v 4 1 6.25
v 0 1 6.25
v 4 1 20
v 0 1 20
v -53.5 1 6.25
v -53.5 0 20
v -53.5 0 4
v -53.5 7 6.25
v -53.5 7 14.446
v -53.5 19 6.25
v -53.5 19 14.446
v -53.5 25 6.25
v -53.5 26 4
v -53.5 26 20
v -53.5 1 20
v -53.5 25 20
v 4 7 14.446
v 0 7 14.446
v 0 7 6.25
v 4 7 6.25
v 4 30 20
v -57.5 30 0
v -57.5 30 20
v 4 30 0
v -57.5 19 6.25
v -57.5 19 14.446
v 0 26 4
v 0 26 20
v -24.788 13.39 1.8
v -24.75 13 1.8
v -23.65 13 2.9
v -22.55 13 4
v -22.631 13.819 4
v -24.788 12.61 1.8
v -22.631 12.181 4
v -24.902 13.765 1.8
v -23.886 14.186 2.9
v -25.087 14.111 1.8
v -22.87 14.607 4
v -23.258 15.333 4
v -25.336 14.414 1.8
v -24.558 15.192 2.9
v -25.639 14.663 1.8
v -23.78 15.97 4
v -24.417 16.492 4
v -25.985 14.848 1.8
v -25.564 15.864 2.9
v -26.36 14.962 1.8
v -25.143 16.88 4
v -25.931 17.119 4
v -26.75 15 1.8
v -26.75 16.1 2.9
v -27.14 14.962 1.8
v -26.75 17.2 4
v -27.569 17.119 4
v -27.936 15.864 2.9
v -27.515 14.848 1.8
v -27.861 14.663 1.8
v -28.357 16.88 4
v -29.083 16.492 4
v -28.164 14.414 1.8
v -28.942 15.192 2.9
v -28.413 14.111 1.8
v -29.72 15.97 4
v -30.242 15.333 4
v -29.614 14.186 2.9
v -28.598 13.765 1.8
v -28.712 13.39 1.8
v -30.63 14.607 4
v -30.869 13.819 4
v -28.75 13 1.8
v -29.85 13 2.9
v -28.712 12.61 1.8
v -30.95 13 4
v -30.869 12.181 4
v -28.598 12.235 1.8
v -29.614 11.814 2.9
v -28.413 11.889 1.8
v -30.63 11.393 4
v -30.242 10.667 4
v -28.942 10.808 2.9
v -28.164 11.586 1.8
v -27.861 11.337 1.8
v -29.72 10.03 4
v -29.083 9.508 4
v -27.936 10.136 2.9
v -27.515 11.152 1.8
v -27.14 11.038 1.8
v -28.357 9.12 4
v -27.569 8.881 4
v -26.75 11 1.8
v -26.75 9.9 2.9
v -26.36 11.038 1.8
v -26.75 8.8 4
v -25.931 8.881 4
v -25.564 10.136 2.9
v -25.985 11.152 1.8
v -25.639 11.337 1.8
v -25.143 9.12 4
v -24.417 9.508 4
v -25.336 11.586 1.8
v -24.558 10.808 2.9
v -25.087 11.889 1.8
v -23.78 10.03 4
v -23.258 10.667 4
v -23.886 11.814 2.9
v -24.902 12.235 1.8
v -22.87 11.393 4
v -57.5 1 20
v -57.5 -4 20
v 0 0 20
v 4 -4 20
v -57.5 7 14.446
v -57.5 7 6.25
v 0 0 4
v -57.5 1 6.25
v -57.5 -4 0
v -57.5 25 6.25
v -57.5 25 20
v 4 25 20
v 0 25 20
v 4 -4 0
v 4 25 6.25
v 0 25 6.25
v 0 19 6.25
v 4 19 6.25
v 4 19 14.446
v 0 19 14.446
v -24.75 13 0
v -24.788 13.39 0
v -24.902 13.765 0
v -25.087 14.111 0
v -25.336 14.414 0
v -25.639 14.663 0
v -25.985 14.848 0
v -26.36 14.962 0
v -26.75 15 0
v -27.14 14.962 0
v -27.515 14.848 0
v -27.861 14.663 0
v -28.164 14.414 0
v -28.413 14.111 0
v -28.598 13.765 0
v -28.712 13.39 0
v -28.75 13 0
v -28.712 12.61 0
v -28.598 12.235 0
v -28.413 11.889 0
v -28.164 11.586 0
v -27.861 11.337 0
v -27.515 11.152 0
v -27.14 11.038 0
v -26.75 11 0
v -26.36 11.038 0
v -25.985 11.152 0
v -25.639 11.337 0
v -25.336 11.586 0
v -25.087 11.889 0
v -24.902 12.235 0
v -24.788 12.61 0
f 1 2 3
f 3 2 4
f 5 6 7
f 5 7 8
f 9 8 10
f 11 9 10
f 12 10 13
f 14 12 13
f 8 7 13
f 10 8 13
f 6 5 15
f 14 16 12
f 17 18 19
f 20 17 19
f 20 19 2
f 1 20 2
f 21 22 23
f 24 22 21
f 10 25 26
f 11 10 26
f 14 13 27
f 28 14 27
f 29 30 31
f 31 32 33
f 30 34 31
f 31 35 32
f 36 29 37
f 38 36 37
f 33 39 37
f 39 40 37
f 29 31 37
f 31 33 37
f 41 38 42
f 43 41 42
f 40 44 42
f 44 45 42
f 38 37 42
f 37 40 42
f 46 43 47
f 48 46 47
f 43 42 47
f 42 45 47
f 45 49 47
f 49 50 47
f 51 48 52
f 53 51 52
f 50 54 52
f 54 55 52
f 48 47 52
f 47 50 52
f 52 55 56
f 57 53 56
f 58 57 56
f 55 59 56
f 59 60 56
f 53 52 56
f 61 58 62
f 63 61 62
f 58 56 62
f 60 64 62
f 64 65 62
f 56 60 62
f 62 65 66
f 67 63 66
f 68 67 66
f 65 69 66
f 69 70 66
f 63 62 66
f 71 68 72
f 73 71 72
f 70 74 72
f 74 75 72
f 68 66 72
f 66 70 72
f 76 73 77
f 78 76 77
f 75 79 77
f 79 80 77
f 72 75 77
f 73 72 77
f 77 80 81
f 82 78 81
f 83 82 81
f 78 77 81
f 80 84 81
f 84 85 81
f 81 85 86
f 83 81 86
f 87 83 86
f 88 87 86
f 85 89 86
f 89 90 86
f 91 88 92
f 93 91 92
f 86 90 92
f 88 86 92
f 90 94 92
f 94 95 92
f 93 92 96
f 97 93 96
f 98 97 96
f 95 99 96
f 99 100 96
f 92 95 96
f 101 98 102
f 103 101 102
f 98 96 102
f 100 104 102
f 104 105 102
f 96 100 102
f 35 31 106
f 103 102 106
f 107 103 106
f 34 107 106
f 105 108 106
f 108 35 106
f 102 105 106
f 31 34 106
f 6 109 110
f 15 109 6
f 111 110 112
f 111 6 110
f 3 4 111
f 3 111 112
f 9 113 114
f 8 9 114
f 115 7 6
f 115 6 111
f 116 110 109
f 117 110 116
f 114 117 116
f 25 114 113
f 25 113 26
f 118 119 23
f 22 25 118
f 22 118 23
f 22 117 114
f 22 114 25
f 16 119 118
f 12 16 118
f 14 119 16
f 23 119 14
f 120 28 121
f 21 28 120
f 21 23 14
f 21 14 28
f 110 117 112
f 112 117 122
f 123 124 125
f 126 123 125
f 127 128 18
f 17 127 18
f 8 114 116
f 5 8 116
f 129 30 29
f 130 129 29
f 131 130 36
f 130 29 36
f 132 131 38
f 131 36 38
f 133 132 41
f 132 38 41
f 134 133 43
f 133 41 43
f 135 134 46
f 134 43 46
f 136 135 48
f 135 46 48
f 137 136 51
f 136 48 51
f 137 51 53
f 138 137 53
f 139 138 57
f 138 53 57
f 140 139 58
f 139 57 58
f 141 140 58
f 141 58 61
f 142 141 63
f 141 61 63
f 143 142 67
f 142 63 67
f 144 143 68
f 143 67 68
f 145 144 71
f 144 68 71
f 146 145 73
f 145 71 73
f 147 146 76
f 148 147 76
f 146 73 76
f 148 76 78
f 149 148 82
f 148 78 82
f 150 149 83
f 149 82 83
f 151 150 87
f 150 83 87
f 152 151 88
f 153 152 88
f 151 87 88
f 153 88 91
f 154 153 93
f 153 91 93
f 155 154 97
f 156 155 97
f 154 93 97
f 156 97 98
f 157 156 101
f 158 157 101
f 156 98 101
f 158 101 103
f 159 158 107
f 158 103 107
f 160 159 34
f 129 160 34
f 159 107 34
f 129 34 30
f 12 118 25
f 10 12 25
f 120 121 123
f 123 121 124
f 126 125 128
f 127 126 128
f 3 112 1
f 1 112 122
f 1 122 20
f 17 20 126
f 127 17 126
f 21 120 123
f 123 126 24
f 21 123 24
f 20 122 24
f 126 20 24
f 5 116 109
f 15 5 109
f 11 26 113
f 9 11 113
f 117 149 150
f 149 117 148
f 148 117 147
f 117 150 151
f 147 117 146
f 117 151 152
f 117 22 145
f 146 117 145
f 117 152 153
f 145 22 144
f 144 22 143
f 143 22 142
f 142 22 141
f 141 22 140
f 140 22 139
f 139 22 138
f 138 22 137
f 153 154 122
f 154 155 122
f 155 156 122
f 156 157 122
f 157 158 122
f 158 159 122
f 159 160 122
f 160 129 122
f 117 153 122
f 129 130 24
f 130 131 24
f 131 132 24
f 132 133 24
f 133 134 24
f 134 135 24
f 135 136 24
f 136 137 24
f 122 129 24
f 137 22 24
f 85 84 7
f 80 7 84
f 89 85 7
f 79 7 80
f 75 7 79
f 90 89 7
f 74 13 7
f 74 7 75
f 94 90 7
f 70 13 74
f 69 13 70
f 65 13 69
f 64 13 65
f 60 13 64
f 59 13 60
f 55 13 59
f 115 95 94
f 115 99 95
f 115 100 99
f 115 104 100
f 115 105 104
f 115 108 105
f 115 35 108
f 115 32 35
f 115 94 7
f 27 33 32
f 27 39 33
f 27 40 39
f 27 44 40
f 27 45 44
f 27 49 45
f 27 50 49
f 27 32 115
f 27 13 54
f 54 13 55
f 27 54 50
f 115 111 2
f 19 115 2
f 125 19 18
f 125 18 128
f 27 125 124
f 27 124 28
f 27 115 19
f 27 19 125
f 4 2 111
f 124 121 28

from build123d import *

# Parameters (mm, degrees)
SCHIZZO1_W                   = 61.5
SCHIZZO1_H                   = 34
SCHIZZO1_W_2                 = 53.5
SCHIZZO1_H_2                 = 26
ESTRUSIONE_SOTTILE1_DEPTH    = 20
SCHIZZO2_W                   = 53.5
SCHIZZO2_H                   = 26
ESTRUSIONE_ESTRUSIONE1_DEPTH = 4
SCHIZZO3_R                   = 2
TAGLIO_ESTRUSIONE1_DEPTH     = 4
TAGLIO_ESTRUSIONE3_DEPTH     = 72.289901108
SMUSSO1_SIZE                 = 2.2


with BuildPart() as part:
    # Schizzo1 → Estrusione-Sottile1 (new body)
    with BuildSketch(Plane.XY):
        with Locations((-26.75, 13)):
            Rectangle(SCHIZZO1_W, SCHIZZO1_H)
        with Locations((-26.75, 13)):
            Rectangle(SCHIZZO1_W_2, SCHIZZO1_H_2, mode=Mode.SUBTRACT)
    extrude(amount=ESTRUSIONE_SOTTILE1_DEPTH)

    # Schizzo2 → Estrusione-Estrusione1 (add)
    with BuildSketch(Plane.XY):
        with Locations((-26.75, 13)):
            Rectangle(SCHIZZO2_W, SCHIZZO2_H)
    extrude(amount=ESTRUSIONE_ESTRUSIONE1_DEPTH)

    # Schizzo3 → Taglio-Estrusione1 (cut)
    with BuildSketch(Plane.XY.offset(4)):
        with Locations((-26.75, 13)):
            Circle(SCHIZZO3_R)
    extrude(amount=-TAGLIO_ESTRUSIONE1_DEPTH, mode=Mode.SUBTRACT)

    # Schizzo4 → Taglio-Estrusione3 (cut, through all)
    with BuildSketch(Plane.ZY.offset(57.5)):
        Polygon((20, 110.783466983), (20, 27), (20, 25), (6.250230313, 25), (6.250230313, 19), (14.445683016, 19), (14.445683016, 7), (6.250230313, 7), (6.250230313, 1), (20, 1), (20, -1), (20, -84.783466983), (187.566933966, -84.783466983), (187.566933966, 110.783466983), align=None)
    extrude(amount=-TAGLIO_ESTRUSIONE3_DEPTH, mode=Mode.SUBTRACT)

    # Smusso1
    smusso1_edges = [part.edges().sort_by_distance(p)[0] for p in [
        (-28.75, 13, 4),
    ]]
    chamfer(smusso1_edges, length=SMUSSO1_SIZE)


solid = part.part
